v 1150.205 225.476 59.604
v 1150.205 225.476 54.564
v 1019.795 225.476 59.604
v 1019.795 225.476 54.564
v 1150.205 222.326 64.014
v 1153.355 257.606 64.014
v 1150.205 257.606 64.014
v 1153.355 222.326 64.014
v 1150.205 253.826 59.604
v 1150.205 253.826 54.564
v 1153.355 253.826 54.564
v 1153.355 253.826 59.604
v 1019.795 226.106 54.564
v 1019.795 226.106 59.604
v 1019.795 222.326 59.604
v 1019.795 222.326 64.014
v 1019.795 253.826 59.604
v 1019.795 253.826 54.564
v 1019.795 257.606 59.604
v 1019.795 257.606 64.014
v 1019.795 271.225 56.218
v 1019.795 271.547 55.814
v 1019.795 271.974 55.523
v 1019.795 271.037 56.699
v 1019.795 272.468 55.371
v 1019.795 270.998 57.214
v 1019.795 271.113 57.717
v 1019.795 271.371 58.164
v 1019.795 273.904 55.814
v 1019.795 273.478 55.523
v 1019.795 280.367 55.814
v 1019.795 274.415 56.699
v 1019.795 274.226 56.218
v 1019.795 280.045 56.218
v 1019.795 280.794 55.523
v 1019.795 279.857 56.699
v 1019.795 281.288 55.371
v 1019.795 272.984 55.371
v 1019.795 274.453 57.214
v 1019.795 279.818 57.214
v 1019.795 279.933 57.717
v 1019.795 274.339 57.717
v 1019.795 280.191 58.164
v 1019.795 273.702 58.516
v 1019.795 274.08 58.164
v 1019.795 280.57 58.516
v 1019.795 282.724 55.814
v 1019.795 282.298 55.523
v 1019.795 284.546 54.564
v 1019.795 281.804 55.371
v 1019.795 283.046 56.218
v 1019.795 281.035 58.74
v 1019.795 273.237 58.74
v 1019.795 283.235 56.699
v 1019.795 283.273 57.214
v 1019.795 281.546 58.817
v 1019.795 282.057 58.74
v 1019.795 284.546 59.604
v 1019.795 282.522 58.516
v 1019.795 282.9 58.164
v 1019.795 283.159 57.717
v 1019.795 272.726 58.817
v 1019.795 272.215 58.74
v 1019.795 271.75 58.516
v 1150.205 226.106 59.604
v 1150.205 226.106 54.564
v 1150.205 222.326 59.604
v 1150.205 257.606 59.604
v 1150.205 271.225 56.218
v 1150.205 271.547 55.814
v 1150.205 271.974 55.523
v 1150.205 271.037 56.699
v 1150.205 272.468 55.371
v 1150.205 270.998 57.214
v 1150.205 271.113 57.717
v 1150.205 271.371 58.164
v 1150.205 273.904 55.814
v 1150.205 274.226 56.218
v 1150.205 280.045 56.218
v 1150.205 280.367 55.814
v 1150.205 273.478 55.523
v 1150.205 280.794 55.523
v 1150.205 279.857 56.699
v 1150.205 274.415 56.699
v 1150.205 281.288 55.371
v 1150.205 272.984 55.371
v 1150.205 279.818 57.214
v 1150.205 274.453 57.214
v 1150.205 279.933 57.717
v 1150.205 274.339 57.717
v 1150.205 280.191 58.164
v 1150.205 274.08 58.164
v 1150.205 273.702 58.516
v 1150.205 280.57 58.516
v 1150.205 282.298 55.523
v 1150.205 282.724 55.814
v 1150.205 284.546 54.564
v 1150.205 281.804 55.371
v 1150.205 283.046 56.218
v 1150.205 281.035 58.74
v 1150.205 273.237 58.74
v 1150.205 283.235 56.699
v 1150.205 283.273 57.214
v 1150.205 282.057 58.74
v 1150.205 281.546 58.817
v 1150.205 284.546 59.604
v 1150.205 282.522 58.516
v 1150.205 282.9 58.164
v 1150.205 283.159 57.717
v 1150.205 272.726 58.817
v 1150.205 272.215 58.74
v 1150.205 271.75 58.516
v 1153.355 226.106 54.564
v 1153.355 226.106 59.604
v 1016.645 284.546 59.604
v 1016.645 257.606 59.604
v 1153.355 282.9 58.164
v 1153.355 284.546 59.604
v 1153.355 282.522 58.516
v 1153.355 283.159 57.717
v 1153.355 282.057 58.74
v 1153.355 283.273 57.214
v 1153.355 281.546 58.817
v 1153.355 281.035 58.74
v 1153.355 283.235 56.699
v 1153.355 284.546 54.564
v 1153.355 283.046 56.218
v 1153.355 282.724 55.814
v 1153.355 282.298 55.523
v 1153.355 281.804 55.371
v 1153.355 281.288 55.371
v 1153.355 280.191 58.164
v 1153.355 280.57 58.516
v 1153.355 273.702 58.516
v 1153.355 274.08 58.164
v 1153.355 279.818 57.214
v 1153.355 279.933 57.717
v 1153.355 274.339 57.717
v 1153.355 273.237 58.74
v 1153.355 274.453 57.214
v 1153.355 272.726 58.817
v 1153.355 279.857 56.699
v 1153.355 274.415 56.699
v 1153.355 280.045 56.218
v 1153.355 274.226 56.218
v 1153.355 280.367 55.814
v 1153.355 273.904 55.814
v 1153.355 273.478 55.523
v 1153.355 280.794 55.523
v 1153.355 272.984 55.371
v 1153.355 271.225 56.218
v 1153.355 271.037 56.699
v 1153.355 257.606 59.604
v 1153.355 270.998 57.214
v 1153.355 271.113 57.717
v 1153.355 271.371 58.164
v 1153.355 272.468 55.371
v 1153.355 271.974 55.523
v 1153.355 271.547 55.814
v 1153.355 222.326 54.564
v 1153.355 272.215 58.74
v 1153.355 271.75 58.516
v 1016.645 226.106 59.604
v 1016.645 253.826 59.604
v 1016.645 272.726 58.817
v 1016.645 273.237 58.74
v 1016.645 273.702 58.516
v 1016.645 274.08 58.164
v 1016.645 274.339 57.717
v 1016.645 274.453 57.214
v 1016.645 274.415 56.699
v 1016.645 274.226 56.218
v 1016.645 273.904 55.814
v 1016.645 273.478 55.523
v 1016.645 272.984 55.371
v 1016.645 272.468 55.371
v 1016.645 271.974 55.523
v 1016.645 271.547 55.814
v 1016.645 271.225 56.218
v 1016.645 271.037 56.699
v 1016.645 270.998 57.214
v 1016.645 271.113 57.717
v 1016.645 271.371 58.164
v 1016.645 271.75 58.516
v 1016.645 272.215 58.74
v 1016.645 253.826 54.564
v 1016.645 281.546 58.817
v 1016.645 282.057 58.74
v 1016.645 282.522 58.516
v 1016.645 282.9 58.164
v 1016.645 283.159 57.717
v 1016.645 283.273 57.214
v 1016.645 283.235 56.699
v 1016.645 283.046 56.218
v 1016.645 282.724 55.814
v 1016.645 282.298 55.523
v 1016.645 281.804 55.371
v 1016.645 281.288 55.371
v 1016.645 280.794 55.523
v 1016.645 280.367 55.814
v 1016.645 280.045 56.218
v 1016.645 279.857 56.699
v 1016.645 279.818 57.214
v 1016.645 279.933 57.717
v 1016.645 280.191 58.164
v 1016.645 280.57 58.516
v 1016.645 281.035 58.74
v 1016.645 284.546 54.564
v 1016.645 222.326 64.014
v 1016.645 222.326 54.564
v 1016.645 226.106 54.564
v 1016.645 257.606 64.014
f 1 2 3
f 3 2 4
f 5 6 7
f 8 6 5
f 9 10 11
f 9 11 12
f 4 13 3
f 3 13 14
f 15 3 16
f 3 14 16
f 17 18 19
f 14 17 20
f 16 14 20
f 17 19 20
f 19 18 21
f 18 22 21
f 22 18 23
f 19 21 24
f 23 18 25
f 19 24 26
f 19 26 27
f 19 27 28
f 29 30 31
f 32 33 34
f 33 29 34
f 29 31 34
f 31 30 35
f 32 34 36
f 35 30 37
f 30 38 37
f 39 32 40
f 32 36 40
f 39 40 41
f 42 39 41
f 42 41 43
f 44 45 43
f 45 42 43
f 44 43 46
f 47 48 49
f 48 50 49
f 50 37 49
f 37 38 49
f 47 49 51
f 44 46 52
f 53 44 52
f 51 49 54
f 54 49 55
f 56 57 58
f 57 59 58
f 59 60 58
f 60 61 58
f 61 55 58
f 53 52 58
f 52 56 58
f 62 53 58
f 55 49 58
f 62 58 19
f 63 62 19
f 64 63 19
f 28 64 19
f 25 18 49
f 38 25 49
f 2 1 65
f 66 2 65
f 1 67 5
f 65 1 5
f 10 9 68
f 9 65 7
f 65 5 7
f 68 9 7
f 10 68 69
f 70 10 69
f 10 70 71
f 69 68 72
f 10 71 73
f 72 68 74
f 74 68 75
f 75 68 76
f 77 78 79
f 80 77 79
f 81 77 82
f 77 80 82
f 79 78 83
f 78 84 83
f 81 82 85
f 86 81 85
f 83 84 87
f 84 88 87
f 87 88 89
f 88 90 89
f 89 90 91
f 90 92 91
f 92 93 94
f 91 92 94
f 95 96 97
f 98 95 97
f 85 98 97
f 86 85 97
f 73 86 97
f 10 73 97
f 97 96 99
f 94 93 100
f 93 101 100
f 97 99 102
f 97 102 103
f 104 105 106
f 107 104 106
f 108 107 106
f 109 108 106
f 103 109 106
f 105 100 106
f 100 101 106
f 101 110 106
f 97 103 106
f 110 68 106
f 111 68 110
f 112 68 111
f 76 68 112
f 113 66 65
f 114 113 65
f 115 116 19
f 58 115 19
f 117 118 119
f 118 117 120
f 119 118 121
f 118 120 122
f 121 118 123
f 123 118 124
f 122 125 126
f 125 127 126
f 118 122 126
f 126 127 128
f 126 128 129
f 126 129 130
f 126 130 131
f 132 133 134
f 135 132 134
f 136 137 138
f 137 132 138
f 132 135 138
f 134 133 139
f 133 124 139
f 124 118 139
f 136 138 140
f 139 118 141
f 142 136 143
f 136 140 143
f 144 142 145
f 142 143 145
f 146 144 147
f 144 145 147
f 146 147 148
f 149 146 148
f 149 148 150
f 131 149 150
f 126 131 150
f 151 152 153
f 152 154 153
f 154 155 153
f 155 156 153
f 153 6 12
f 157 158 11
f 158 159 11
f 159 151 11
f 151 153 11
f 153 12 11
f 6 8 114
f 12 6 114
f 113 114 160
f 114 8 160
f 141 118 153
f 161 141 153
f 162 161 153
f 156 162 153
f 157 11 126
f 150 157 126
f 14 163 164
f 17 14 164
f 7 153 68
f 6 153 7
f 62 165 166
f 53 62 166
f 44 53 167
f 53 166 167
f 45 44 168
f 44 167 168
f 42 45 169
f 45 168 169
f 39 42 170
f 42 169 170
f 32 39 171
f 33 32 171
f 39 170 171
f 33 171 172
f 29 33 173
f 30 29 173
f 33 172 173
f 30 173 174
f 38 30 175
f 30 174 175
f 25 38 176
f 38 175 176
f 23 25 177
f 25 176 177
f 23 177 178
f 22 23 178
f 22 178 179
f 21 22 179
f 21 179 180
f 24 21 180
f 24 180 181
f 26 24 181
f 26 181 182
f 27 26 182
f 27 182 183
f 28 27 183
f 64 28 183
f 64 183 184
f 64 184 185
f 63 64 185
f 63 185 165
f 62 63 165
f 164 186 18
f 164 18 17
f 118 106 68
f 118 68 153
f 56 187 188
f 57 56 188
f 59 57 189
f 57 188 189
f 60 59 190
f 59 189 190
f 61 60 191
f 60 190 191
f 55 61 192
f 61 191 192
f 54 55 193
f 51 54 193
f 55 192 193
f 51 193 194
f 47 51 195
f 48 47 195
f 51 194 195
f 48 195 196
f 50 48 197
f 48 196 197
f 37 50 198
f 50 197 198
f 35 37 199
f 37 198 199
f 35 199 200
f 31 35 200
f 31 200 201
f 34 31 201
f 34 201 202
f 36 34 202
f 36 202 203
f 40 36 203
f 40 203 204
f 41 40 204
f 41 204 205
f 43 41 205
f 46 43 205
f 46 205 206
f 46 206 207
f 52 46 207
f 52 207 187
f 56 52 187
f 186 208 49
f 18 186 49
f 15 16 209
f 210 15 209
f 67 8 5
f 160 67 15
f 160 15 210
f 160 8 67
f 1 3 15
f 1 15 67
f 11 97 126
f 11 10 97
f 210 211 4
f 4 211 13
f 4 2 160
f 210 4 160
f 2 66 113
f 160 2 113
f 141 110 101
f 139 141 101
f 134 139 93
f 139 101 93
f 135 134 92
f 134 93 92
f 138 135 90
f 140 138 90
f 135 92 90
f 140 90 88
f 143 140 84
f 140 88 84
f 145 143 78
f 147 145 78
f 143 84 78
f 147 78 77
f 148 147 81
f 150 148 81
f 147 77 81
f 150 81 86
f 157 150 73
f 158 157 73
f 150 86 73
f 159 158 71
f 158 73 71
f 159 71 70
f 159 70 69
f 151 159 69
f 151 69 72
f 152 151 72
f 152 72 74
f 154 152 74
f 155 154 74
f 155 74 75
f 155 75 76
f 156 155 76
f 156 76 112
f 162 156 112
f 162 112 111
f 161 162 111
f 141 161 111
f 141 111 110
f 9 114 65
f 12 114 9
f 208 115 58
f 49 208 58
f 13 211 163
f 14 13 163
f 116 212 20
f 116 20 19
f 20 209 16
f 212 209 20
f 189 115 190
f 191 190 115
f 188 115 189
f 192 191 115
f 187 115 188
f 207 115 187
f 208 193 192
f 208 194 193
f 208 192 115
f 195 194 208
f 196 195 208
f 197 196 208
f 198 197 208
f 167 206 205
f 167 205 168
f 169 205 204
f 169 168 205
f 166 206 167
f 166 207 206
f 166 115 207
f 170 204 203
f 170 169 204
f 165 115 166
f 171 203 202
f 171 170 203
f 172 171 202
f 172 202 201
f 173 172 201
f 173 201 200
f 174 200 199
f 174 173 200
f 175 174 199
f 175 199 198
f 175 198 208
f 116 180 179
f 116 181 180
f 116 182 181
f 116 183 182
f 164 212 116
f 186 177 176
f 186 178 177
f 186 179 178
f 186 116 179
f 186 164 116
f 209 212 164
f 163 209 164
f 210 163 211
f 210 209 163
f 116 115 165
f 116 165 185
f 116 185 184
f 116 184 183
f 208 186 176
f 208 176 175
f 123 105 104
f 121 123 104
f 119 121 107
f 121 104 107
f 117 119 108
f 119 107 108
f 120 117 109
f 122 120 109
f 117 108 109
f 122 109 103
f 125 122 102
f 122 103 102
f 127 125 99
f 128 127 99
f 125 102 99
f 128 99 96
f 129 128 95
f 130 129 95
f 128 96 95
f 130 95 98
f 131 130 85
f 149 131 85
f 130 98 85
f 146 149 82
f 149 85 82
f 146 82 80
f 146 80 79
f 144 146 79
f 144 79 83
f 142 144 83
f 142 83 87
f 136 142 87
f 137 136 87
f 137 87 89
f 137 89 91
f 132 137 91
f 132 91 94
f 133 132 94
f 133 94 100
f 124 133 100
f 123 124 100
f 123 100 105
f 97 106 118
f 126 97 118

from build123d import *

# Parameters (mm, degrees)
SALIENTE_EXTRUIR1_DEPTH = 80
CROQUIS2_R              = 27.5
CORTAR_EXTRUIR2_DEPTH   = 2387.503718832
SALIENTE_EXTRUIR2_DEPTH = 50
CROQUIS4_W              = 80
CROQUIS4_H              = 440
CORTAR_EXTRUIR3_DEPTH   = 2390.874473691
SALIENTE_EXTRUIR3_DEPTH = 50
ESCALA1_SCALE           = 0.063
CROQUIS9_W              = 136.71
CROQUIS9_H              = 5.04
SALIENTE_EXTRUIR5_DEPTH = 13
CROQUIS10_W             = 130.41
CROQUIS10_H             = 8
CORTAR_EXTRUIR4_DEPTH   = 10
CROQUIS11_W             = 136.71
CROQUIS11_H             = 13.15
CORTAR_EXTRUIR5_DEPTH   = 1192.165803699


with BuildPart() as part:
    # Croquis1 → Saliente-Extruir1 (new body)
    with BuildSketch(Plane.XY):
        Polygon((0, 0), (2170, 0), (2170, 990), (2120, 990), (2120, 50), (50, 50), (50, 990), (0, 990), align=None)
    extrude(amount=SALIENTE_EXTRUIR1_DEPTH)

    # Croquis2 → Cortar-Extruir2 (cut, through all)
    with BuildSketch(Plane.ZY):
        with Locations((40, 940)):
            Circle(CROQUIS2_R)
        with Locations((40, 800)):
            Circle(CROQUIS2_R)
    extrude(amount=-CORTAR_EXTRUIR2_DEPTH, mode=Mode.SUBTRACT)

    # Croquis3 → Saliente-Extruir2 (add)
    with BuildSketch(Plane.ZY):
        Polygon((150, 560), (80, 560), (0, 560), (0, 500), (80, 500), (80, 60), (0, 60), (0, 0), (150, 0), align=None)
    extrude(amount=-SALIENTE_EXTRUIR2_DEPTH)

    # Croquis4 → Cortar-Extruir3 (cut, through all)
    with BuildSketch(Plane.ZY):
        with Locations((40, 280)):
            Rectangle(CROQUIS4_W, CROQUIS4_H)
    extrude(amount=-CORTAR_EXTRUIR3_DEPTH, mode=Mode.SUBTRACT)


with BuildPart() as cortar_extruir3_piece_1:
    # of the separate pieces the step leaves, piece 1, a body of its own (cortar_extruir3_pieces)
    add(part.part.solids().sort_by_distance((0, 0, 0))[0])



with BuildPart() as cortar_extruir3_piece_2:
    # of the separate pieces the step leaves, piece 2, a body of its own (cortar_extruir3_pieces)
    add(part.part.solids().sort_by_distance((2120, 500, 0))[0])


with BuildPart() as cortar_extruir3_piece_1_1:
    add(cortar_extruir3_piece_1.part)

    add(cortar_extruir3_piece_2.part)  # Saliente-Extruir3 merges Cortar-Extruir3 piece 2
    # Croquis5 → Saliente-Extruir3 (add)
    with BuildSketch(Plane(origin=(2170, 0, 0), x_dir=(0, 0, -1), z_dir=(1, 0, 0))):
        Polygon((-150, 50), (-150, 0), (0, 0), (0, 60), (-80, 60), (-80, 500), (0, 500), (0, 560), (-150, 560), align=None)
    extrude(amount=-SALIENTE_EXTRUIR3_DEPTH)


with BuildPart() as cortar_extruir3_piece_1_2:
    # Escala1: scaled about (1085, 237.274110873, 58.232745712)
    add(cortar_extruir3_piece_1_1.part.scale(ESCALA1_SCALE).moved(Location((1016.645, 222.325841888, 54.564082732))))

    # Croquis9 → Saliente-Extruir5 (add)
    with BuildSketch(Plane(origin=(0, 284.695841888, 0), x_dir=(1, 0, 0), z_dir=(0, 1, 0))):
        with Locations((1085, -57.084082732)):
            Rectangle(CROQUIS9_W, CROQUIS9_H)
    extrude(amount=SALIENTE_EXTRUIR5_DEPTH)

    # Croquis10 → Cortar-Extruir4 (cut)
    with BuildSketch(Plane.XY.offset(59.604082732)):
        with Locations((1085, 288.695841888)):
            Rectangle(CROQUIS10_W, CROQUIS10_H)
    extrude(amount=-CORTAR_EXTRUIR4_DEPTH, mode=Mode.SUBTRACT)

    # Croquis11 → Cortar-Extruir5 (cut, through all)
    with BuildSketch(Plane.XY.offset(59.604082732)):
        with Locations((1085, 291.120841888)):
            Rectangle(CROQUIS11_W, CROQUIS11_H)
    extrude(amount=-CORTAR_EXTRUIR5_DEPTH, mode=Mode.SUBTRACT)


solid = cortar_extruir3_piece_1_2.part
